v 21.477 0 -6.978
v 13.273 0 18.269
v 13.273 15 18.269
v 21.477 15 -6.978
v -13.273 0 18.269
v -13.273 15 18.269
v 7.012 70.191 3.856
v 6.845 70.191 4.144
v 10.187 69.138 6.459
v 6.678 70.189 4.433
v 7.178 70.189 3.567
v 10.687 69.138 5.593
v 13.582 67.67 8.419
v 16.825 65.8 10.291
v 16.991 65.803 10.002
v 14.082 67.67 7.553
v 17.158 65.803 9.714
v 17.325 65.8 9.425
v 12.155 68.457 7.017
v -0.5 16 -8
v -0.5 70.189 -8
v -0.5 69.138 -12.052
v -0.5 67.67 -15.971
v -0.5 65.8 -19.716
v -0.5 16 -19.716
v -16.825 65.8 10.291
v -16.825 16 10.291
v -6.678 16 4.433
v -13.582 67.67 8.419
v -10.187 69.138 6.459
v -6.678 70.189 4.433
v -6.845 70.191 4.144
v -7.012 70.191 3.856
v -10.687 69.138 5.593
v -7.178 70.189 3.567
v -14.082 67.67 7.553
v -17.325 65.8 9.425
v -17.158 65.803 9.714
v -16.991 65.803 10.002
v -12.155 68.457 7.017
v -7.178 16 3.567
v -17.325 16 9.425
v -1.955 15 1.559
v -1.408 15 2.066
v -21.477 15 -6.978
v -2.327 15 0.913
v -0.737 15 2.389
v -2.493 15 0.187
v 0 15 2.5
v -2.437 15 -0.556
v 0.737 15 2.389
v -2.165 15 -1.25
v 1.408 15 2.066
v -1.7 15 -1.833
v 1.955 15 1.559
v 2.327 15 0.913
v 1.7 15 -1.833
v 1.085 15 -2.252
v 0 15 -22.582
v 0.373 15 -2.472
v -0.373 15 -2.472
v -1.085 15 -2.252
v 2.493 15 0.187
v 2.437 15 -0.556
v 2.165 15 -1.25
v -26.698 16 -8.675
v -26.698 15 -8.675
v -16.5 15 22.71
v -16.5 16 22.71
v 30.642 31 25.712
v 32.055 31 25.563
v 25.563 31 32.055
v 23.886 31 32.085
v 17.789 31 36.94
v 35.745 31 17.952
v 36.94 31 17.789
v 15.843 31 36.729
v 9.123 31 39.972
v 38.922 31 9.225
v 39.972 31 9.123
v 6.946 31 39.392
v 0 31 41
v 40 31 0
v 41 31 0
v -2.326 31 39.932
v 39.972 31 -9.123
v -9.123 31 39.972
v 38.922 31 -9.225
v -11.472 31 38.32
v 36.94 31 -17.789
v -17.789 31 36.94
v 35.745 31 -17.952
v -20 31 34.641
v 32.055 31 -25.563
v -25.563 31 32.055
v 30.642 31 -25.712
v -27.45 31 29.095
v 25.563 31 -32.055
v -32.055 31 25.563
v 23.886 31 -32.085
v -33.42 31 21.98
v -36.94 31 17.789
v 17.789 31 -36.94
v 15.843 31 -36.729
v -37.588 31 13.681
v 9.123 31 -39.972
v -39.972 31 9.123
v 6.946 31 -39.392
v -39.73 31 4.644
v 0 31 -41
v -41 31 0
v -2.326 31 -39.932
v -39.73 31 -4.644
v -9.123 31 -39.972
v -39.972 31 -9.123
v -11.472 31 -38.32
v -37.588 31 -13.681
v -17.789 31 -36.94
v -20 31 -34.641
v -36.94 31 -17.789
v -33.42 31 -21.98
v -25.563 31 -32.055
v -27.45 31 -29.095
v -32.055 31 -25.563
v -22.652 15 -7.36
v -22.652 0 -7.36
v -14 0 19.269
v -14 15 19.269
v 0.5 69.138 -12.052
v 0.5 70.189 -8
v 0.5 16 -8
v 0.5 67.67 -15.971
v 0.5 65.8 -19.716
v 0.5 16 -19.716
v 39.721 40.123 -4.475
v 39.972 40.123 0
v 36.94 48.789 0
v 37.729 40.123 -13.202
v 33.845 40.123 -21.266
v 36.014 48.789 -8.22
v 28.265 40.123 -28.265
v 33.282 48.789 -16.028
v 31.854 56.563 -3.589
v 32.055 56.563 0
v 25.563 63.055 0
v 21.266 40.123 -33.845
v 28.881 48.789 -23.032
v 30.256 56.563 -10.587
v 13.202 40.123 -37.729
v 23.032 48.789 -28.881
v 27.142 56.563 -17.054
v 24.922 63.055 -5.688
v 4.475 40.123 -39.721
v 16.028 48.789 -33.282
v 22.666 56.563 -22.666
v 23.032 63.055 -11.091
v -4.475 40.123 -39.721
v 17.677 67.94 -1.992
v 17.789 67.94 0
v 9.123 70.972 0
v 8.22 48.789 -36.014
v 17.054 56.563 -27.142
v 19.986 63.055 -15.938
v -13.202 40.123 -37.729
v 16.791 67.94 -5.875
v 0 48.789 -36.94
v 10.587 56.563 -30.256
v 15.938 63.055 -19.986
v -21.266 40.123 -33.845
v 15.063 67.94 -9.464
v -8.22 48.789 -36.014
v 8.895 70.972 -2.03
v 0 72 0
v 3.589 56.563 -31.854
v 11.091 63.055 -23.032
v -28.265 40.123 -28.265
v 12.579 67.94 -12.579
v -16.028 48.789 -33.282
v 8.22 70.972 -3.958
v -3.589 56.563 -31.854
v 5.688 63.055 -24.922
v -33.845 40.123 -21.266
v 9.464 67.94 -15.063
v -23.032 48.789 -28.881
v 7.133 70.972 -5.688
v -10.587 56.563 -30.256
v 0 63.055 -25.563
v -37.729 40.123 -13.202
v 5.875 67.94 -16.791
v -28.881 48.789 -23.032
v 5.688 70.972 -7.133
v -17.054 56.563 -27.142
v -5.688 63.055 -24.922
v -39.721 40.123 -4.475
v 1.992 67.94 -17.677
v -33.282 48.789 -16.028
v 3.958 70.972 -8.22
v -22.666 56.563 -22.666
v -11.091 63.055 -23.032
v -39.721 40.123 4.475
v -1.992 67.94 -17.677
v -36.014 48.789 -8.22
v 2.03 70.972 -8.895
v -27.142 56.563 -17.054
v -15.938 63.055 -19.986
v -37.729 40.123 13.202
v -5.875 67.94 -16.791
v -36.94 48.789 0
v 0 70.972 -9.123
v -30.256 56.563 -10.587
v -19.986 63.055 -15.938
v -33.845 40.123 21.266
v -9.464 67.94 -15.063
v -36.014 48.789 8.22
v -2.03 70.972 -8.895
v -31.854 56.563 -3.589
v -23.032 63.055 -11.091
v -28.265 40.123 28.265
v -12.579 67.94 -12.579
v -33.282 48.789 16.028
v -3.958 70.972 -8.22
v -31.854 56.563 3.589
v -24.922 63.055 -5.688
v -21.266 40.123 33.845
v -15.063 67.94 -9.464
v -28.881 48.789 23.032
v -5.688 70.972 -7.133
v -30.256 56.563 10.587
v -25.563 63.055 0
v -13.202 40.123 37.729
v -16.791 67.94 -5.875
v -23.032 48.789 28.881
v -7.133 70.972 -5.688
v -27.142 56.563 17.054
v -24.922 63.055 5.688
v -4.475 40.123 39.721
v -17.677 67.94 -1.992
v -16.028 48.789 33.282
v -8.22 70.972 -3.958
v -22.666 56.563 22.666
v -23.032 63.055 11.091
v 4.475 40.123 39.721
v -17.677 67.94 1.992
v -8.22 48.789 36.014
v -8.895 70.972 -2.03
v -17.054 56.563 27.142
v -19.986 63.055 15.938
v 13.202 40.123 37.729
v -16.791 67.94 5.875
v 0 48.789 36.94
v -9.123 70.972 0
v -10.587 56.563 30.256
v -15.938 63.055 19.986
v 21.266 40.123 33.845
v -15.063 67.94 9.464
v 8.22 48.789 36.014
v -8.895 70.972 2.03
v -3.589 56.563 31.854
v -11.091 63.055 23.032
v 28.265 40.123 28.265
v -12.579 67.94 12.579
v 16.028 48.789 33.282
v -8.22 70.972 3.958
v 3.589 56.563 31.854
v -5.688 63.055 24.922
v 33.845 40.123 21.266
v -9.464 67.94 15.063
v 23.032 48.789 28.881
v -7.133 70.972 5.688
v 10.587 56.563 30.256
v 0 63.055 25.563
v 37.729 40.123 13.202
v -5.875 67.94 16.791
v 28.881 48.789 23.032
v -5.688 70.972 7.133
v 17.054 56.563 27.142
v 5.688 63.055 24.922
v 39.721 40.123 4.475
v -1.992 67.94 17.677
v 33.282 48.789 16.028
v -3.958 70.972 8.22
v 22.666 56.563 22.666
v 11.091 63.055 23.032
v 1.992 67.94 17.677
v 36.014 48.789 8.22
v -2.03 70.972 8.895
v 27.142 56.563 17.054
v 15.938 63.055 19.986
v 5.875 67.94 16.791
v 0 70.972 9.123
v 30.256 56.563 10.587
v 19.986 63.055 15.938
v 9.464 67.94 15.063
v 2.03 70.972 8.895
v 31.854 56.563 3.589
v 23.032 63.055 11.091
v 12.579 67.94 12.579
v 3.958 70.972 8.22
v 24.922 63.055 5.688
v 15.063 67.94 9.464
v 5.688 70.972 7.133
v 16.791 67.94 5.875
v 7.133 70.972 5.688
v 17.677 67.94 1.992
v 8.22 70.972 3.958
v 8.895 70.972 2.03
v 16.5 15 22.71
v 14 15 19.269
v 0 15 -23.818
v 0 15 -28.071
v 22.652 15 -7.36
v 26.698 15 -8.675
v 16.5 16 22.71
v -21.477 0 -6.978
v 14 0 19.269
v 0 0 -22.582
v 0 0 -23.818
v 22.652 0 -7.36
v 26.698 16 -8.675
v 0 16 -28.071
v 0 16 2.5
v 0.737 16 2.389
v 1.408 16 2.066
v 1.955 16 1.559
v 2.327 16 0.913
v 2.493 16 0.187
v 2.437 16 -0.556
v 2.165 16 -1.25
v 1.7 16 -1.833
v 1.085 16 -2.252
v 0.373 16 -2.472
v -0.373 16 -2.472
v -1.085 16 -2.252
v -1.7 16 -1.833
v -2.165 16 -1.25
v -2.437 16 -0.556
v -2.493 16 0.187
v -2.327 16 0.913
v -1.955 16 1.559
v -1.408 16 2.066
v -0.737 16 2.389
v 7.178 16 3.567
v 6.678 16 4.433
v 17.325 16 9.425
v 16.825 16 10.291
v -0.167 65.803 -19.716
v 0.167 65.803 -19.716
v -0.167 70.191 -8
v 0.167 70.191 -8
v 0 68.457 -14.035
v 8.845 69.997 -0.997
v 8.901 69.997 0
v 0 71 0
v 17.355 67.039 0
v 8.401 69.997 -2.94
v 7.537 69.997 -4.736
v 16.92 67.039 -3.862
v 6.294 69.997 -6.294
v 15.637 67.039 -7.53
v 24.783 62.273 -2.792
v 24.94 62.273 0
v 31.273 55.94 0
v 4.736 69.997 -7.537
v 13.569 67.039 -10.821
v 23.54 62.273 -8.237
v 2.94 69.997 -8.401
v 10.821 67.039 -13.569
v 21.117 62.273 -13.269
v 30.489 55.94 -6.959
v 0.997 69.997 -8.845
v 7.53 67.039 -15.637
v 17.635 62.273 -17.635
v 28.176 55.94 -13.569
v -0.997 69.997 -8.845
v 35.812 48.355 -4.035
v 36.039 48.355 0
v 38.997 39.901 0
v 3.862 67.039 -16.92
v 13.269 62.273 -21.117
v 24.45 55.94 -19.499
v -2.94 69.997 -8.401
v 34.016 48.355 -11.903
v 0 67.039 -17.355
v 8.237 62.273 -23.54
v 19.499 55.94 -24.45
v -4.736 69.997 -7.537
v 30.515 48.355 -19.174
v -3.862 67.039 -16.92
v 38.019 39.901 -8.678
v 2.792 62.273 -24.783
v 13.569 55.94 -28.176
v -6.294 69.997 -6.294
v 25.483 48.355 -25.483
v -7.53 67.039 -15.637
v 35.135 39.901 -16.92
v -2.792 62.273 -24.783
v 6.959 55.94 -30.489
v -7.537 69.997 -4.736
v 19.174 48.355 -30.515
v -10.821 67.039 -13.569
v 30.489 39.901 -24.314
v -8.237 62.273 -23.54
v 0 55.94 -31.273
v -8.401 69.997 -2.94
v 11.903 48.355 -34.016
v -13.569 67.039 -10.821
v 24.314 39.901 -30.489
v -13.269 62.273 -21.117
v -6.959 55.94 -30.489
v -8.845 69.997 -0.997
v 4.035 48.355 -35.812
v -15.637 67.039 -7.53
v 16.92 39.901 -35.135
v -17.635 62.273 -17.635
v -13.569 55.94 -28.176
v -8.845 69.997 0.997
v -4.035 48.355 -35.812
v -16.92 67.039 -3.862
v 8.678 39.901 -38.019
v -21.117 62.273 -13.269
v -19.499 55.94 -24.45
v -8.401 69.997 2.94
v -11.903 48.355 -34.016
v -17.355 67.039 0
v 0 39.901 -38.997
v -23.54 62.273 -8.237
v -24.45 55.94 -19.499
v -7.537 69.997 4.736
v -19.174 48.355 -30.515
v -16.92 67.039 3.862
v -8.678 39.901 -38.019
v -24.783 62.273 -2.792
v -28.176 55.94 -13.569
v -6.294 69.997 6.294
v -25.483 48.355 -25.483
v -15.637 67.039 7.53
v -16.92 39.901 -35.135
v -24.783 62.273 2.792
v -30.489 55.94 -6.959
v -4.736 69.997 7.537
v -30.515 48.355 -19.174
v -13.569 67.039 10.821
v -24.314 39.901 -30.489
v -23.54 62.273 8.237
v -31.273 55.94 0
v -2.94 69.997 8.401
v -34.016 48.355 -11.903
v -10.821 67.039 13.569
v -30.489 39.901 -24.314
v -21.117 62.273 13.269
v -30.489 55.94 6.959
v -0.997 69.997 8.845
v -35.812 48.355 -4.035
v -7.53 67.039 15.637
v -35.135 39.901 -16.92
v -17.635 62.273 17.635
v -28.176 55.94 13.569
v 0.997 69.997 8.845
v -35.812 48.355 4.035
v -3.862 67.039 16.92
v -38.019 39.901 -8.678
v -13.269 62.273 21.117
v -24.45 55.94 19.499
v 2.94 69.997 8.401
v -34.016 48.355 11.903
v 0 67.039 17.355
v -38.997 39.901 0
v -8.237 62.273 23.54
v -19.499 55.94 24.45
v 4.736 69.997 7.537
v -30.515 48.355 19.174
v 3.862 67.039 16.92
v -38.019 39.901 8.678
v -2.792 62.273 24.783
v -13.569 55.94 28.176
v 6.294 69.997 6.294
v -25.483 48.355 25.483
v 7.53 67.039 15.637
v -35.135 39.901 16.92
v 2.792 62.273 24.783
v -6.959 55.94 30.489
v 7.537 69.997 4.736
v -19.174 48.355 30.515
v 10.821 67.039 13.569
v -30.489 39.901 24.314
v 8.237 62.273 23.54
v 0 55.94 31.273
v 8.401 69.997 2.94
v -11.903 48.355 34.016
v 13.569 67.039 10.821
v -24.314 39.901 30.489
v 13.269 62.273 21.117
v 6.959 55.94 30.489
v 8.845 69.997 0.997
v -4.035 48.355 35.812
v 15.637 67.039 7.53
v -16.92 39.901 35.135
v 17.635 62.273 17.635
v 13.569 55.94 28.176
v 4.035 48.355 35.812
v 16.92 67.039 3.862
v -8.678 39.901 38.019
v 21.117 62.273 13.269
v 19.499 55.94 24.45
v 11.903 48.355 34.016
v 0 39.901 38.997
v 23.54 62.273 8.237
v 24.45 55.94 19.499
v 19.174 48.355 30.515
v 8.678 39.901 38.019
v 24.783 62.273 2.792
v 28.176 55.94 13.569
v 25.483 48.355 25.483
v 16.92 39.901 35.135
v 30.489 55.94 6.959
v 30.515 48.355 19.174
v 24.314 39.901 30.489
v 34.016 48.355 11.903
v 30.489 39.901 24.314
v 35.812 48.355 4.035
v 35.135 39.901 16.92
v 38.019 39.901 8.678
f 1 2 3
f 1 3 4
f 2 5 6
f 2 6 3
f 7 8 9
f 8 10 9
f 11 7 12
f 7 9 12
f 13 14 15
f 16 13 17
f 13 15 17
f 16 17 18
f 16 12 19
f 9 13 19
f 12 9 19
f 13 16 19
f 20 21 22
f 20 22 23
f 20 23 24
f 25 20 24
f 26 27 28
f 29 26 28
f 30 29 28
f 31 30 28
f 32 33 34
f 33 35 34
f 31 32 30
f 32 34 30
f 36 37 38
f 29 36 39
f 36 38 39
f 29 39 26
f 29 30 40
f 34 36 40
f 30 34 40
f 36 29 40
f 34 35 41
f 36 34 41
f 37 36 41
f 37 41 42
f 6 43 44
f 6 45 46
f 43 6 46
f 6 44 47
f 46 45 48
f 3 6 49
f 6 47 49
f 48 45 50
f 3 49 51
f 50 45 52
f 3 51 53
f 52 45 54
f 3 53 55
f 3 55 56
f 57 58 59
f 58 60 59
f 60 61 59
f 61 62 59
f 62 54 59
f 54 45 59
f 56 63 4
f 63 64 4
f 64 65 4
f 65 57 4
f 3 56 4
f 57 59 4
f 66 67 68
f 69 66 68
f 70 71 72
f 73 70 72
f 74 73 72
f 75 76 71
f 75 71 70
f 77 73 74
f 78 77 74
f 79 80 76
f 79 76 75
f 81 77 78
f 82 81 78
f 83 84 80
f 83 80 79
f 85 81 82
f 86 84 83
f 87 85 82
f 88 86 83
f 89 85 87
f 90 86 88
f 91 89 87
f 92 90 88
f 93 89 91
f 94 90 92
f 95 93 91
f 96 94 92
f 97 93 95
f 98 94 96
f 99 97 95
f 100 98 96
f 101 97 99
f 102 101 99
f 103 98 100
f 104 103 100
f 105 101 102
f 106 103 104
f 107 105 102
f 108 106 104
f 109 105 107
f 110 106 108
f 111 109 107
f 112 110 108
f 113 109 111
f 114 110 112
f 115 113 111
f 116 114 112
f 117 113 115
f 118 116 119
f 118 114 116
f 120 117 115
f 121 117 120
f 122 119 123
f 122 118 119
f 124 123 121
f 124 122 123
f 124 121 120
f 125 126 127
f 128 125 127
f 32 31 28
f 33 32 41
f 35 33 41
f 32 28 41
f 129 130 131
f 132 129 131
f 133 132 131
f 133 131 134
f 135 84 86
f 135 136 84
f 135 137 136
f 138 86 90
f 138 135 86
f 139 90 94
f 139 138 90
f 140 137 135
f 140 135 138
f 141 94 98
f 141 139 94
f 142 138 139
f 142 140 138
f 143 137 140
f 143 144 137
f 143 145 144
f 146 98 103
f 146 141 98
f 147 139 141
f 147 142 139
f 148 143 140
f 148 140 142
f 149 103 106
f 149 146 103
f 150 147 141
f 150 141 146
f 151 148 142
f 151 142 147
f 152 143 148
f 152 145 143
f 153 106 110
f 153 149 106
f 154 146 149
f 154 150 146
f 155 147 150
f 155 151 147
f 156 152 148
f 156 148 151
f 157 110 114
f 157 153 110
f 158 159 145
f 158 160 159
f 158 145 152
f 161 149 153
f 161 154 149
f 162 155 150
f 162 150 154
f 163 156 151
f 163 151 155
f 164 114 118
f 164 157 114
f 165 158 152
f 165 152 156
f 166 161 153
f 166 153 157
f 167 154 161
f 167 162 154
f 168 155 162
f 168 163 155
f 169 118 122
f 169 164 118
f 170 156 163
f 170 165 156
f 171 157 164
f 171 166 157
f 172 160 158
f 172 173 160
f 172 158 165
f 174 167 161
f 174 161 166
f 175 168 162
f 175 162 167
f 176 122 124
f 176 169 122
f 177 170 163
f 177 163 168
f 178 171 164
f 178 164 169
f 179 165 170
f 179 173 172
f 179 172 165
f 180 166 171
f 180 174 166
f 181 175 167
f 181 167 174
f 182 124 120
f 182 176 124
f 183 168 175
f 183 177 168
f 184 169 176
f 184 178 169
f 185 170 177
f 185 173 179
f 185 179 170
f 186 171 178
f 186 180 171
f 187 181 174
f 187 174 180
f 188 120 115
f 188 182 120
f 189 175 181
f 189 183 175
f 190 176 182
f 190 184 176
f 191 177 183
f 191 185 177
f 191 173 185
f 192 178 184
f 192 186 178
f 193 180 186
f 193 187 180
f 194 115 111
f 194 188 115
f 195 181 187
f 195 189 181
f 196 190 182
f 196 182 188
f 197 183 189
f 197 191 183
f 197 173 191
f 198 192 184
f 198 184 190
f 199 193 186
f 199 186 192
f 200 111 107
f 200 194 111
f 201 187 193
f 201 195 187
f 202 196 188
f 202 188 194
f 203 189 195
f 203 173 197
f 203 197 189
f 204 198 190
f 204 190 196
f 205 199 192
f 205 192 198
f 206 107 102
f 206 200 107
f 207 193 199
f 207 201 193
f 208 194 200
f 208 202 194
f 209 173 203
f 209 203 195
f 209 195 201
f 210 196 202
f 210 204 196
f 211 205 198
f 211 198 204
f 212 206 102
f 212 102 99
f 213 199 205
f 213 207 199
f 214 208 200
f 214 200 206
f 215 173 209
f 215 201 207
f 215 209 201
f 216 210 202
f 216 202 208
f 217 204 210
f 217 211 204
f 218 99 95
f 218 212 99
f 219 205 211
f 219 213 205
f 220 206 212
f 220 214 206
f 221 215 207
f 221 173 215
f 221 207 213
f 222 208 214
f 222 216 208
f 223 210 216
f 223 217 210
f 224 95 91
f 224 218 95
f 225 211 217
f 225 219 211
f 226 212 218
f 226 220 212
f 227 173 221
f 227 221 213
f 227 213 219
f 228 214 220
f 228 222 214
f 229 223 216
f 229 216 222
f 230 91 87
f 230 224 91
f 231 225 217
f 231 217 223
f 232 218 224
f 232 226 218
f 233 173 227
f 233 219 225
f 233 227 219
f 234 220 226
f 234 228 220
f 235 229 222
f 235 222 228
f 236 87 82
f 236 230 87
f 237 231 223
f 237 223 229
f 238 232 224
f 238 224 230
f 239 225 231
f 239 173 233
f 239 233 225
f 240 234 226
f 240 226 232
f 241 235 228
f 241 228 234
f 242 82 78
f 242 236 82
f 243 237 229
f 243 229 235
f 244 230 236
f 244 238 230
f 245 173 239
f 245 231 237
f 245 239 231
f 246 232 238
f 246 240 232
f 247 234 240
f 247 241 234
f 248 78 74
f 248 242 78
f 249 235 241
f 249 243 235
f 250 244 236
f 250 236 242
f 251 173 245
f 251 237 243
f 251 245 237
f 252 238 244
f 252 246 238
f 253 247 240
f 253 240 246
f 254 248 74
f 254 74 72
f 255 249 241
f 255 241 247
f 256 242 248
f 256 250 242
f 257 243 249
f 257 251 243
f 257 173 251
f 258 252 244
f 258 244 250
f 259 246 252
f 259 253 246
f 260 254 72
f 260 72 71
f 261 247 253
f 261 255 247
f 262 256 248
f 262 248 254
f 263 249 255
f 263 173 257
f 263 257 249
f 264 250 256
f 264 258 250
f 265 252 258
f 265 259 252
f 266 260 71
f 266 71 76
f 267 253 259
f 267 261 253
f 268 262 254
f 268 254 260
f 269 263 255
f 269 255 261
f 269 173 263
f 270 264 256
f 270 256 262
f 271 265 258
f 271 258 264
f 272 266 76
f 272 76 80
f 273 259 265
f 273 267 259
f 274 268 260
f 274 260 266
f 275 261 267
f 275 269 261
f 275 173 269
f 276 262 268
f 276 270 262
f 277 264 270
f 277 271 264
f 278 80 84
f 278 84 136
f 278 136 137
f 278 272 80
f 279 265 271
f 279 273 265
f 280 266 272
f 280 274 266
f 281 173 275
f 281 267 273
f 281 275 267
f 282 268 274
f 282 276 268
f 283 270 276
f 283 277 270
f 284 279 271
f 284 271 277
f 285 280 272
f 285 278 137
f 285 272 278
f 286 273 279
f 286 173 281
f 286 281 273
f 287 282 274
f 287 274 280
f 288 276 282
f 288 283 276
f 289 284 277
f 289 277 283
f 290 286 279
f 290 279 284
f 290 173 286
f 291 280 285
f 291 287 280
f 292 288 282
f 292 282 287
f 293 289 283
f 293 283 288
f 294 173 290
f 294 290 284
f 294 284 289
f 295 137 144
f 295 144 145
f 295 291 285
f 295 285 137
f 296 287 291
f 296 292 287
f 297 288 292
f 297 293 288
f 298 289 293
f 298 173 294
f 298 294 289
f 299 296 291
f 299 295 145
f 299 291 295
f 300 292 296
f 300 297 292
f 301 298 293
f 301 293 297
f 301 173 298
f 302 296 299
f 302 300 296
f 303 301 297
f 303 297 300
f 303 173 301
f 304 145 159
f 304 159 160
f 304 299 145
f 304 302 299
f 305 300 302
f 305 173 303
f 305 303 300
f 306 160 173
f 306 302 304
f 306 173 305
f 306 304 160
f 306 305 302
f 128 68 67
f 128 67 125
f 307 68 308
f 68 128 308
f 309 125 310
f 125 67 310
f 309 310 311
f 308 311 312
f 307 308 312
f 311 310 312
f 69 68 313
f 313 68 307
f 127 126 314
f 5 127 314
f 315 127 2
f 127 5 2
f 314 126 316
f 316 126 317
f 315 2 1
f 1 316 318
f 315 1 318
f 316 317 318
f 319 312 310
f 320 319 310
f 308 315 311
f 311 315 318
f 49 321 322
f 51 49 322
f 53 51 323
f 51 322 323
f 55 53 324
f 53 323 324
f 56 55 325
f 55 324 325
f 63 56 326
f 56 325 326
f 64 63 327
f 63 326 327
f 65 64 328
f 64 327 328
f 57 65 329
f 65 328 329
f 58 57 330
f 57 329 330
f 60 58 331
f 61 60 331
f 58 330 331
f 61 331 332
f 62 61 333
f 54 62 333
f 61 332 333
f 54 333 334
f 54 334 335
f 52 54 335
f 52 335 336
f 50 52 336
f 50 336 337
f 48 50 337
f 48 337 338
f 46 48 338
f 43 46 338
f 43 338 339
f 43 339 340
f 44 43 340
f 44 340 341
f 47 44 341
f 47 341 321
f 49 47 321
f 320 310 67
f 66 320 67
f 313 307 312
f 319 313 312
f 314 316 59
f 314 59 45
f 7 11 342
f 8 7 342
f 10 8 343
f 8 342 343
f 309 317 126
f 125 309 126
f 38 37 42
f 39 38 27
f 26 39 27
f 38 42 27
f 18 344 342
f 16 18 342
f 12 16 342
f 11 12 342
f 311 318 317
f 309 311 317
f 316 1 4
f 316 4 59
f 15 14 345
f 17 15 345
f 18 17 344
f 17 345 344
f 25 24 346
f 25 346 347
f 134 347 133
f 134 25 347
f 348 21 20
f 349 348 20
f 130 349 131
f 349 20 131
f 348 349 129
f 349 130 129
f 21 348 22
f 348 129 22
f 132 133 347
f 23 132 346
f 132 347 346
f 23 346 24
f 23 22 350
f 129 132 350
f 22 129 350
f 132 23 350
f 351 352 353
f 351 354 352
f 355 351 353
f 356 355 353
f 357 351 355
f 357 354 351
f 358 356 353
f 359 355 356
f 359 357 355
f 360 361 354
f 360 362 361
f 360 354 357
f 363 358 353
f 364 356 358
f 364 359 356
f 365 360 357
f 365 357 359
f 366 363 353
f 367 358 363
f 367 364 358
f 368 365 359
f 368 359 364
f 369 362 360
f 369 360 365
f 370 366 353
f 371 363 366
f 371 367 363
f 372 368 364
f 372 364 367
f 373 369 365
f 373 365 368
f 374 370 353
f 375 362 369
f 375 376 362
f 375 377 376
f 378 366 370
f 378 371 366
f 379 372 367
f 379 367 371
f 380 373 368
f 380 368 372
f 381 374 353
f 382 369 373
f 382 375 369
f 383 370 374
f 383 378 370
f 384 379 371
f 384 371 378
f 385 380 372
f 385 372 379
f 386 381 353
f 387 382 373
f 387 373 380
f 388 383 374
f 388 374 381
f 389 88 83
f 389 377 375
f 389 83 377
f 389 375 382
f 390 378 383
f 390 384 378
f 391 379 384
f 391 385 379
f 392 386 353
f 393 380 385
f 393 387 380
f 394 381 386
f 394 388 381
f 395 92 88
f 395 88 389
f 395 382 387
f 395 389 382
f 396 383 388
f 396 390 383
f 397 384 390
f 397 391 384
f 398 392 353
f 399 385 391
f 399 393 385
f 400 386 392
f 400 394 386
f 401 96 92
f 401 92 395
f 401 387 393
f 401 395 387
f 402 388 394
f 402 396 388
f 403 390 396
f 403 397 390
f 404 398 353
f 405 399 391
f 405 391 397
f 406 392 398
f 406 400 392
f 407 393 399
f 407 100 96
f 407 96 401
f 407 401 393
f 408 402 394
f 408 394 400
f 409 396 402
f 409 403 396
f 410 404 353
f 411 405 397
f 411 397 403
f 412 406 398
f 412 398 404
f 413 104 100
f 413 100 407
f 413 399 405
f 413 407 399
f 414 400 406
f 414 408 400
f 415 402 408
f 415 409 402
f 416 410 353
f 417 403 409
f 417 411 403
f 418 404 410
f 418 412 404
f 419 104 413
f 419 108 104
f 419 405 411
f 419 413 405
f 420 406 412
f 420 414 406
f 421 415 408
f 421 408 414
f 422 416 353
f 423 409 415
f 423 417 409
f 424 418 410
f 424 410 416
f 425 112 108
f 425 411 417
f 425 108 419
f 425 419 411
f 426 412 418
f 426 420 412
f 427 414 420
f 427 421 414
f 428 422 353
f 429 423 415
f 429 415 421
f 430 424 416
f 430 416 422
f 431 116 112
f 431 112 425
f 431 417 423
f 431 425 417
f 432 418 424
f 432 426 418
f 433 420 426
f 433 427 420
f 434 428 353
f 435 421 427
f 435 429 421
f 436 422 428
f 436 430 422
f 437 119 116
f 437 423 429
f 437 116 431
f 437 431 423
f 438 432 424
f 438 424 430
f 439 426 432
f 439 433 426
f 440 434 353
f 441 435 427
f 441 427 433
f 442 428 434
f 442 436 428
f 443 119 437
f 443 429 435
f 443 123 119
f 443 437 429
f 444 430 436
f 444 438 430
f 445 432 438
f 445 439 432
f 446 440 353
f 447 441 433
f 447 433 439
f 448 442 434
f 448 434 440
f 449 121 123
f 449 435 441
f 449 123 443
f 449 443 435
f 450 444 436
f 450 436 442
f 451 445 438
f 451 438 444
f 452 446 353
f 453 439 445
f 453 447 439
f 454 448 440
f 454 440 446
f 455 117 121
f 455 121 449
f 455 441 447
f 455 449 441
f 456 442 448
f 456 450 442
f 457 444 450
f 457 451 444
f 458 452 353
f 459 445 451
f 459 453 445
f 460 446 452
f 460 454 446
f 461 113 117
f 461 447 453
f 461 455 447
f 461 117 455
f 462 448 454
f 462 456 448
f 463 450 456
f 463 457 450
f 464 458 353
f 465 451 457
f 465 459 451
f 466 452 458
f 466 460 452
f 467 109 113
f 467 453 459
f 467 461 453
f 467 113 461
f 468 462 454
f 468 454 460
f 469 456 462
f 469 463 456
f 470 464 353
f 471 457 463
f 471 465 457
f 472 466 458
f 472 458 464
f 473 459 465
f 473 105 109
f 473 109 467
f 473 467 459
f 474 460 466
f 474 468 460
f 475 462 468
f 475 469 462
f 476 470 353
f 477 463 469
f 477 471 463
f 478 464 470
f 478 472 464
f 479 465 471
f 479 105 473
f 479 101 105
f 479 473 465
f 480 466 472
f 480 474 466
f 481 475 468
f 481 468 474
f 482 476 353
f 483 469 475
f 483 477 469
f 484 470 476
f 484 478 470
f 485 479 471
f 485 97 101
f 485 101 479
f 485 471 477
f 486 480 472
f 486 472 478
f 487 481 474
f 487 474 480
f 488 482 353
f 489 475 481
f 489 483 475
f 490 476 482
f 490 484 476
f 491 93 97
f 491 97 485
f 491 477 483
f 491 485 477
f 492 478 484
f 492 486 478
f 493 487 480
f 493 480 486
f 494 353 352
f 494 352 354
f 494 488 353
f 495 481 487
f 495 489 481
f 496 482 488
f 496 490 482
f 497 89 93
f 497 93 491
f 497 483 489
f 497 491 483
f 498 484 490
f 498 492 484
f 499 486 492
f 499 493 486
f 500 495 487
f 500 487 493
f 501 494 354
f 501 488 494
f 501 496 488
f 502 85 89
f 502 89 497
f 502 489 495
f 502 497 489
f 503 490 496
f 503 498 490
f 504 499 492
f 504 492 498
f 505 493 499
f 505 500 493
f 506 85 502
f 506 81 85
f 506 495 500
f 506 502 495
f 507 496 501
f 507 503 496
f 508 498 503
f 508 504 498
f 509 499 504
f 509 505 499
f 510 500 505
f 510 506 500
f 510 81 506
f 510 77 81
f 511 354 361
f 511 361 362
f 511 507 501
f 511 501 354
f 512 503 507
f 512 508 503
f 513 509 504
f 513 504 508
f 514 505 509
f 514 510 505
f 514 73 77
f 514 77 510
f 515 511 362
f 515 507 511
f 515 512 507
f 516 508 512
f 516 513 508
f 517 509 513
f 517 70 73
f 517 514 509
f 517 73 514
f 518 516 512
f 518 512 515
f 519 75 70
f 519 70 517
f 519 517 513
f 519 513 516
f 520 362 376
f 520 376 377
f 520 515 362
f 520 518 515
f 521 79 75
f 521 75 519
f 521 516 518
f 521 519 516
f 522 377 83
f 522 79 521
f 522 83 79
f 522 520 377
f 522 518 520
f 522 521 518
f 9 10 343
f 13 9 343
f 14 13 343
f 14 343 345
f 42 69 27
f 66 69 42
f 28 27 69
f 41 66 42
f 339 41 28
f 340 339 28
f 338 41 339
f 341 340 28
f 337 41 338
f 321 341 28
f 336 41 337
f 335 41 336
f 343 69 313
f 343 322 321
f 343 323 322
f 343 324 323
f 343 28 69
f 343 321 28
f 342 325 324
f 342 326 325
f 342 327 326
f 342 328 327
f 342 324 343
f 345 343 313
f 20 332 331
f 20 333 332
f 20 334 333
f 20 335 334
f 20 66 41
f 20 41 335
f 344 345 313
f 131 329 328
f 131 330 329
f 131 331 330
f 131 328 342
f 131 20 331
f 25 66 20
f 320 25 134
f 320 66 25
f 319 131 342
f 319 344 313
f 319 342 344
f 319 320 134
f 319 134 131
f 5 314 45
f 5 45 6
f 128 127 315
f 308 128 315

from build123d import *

# Parameters (mm, degrees)
BOSS_EXTRUDE1_DEPTH = 15
BOSS_EXTRUDE2_DEPTH = 1
SKETCH3_R           = 2.5
CUT_EXTRUDE1_DEPTH  = 2
SKETCH4_W           = 1
SKETCH4_H           = 11.716201321
BOSS_EXTRUDE4_DEPTH = 15
BOSS_EXTRUDE6_REACH = 73.014
SKETCH7_W           = 1
SKETCH7_H           = 11.716201321


with BuildPart() as part:
    # Sketch1 → Boss-Extrude1 (new body)
    with BuildSketch(Plane(origin=(0, 0, 0), x_dir=(1, 0, 0), z_dir=(0, 1, 0))):
        Polygon((-22.652475842, 7.36023557), (-14, -19.269346887), (14, -19.269346887), (22.652475842, 7.36023557), (0, 23.818222634), align=None)
        Polygon((13.273457472, -18.269346887), (21.476905338, 6.978269558), (0, 22.582154656), (-21.476905338, 6.978269558), (-13.273457472, -18.269346887), align=None, mode=Mode.SUBTRACT)
    extrude(amount=BOSS_EXTRUDE1_DEPTH)

    # Sketch2 → Boss-Extrude2 (add)
    with BuildSketch(Plane(origin=(0, 15, 0), x_dir=(1, 0, 0), z_dir=(0, 1, 0))):
        Polygon((16.5, -22.710301688), (26.697560814, 8.67456335), (0, 28.071476676), (-26.697560814, 8.67456335), (-16.5, -22.710301688), align=None)
    extrude(amount=BOSS_EXTRUDE2_DEPTH)

    # Sketch3 → Cut-Extrude1 (cut)
    with BuildSketch(Plane(origin=(0, 16, 0), x_dir=(1, 0, 0), z_dir=(0, 1, 0))):
        with Locations(Location((0, 0, 0), (0, 0, 270))):
            Circle(SKETCH3_R)
    extrude(amount=-CUT_EXTRUDE1_DEPTH, mode=Mode.SUBTRACT)

    # Sketch4 → Boss-Extrude4 (add)
    with BuildSketch(Plane(origin=(0, 16, 0), x_dir=(1, 0, 0), z_dir=(0, 1, 0))):
        with Locations((0, 13.85810066)):
            Rectangle(SKETCH4_W, SKETCH4_H)
        Polygon((17.32473121, -9.425087959), (7.17820323, -3.566987298), (6.67820323, -4.433012702), (16.82473121, -10.291113362), align=None)
        Polygon((-16.82473121, -10.291113362), (-6.67820323, -4.433012702), (-7.17820323, -3.566987298), (-17.32473121, -9.425087959), align=None)
    extrude(amount=BOSS_EXTRUDE4_DEPTH)



with BuildPart() as body_2:
    # Sketch6 → Revolve1 (revolve)
    with BuildSketch(Plane.XY, mode=Mode.PRIVATE) as revolve1_sk:
        with BuildLine():
            Line((0, 72), (0, 71))
            ThreePointArc((0, 71), (-28.284271247, 59.284271247), (-40, 31))
            Line((-40, 31), (-41, 31))
            ThreePointArc((-41, 31), (-28.991378029, 59.991378029), (0, 72))
        make_face()
    revolve(revolve1_sk.sketch.rotate(Axis((0, 31, 0), (0, 1, 0)), 180), axis=Axis((0, 31, 0), (0, 1, 0)))


with BuildPart() as part_1:
    add(part.part)

    # Sketch7 → Boss-Extrude6 (add, up to next)
    with BuildSketch(Plane(origin=(0, 31, 0), x_dir=(1, 0, 0), z_dir=(0, 1, 0)), mode=Mode.PRIVATE) as boss_extrude6_sk1:
        Polygon((17.32473121, -9.425087959), (7.17820323, -3.566987298), (6.67820323, -4.433012702), (16.82473121, -10.291113362), align=None)
    boss_extrude6_tool1 = extrude(boss_extrude6_sk1.sketch, amount=BOSS_EXTRUDE6_REACH, mode=Mode.PRIVATE) - body_2.part
    # Sketch7 → Boss-Extrude6 (add, up to next)
    with BuildSketch(Plane(origin=(0, 31, 0), x_dir=(1, 0, 0), z_dir=(0, 1, 0)), mode=Mode.PRIVATE) as boss_extrude6_sk2:
        with Locations((0, 13.85810066)):
            Rectangle(SKETCH7_W, SKETCH7_H)
    boss_extrude6_tool2 = extrude(boss_extrude6_sk2.sketch, amount=BOSS_EXTRUDE6_REACH, mode=Mode.PRIVATE) - body_2.part
    # Sketch7 → Boss-Extrude6 (add, up to next)
    with BuildSketch(Plane(origin=(0, 31, 0), x_dir=(1, 0, 0), z_dir=(0, 1, 0)), mode=Mode.PRIVATE) as boss_extrude6_sk3:
        Polygon((-16.82473121, -10.291113362), (-6.67820323, -4.433012702), (-7.17820323, -3.566987298), (-17.32473121, -9.425087959), align=None)
    boss_extrude6_tool3 = extrude(boss_extrude6_sk3.sketch, amount=BOSS_EXTRUDE6_REACH, mode=Mode.PRIVATE) - body_2.part
    add(boss_extrude6_tool1.solids().sort_by_distance((12.001467, 31, 6.92905))[0])
    add(boss_extrude6_tool2.solids().sort_by_distance((0, 31, -13.858101))[0])
    add(boss_extrude6_tool3.solids().sort_by_distance((-12.001467, 31, 6.92905))[0])


solid = Compound([body_2.part, part_1.part])
